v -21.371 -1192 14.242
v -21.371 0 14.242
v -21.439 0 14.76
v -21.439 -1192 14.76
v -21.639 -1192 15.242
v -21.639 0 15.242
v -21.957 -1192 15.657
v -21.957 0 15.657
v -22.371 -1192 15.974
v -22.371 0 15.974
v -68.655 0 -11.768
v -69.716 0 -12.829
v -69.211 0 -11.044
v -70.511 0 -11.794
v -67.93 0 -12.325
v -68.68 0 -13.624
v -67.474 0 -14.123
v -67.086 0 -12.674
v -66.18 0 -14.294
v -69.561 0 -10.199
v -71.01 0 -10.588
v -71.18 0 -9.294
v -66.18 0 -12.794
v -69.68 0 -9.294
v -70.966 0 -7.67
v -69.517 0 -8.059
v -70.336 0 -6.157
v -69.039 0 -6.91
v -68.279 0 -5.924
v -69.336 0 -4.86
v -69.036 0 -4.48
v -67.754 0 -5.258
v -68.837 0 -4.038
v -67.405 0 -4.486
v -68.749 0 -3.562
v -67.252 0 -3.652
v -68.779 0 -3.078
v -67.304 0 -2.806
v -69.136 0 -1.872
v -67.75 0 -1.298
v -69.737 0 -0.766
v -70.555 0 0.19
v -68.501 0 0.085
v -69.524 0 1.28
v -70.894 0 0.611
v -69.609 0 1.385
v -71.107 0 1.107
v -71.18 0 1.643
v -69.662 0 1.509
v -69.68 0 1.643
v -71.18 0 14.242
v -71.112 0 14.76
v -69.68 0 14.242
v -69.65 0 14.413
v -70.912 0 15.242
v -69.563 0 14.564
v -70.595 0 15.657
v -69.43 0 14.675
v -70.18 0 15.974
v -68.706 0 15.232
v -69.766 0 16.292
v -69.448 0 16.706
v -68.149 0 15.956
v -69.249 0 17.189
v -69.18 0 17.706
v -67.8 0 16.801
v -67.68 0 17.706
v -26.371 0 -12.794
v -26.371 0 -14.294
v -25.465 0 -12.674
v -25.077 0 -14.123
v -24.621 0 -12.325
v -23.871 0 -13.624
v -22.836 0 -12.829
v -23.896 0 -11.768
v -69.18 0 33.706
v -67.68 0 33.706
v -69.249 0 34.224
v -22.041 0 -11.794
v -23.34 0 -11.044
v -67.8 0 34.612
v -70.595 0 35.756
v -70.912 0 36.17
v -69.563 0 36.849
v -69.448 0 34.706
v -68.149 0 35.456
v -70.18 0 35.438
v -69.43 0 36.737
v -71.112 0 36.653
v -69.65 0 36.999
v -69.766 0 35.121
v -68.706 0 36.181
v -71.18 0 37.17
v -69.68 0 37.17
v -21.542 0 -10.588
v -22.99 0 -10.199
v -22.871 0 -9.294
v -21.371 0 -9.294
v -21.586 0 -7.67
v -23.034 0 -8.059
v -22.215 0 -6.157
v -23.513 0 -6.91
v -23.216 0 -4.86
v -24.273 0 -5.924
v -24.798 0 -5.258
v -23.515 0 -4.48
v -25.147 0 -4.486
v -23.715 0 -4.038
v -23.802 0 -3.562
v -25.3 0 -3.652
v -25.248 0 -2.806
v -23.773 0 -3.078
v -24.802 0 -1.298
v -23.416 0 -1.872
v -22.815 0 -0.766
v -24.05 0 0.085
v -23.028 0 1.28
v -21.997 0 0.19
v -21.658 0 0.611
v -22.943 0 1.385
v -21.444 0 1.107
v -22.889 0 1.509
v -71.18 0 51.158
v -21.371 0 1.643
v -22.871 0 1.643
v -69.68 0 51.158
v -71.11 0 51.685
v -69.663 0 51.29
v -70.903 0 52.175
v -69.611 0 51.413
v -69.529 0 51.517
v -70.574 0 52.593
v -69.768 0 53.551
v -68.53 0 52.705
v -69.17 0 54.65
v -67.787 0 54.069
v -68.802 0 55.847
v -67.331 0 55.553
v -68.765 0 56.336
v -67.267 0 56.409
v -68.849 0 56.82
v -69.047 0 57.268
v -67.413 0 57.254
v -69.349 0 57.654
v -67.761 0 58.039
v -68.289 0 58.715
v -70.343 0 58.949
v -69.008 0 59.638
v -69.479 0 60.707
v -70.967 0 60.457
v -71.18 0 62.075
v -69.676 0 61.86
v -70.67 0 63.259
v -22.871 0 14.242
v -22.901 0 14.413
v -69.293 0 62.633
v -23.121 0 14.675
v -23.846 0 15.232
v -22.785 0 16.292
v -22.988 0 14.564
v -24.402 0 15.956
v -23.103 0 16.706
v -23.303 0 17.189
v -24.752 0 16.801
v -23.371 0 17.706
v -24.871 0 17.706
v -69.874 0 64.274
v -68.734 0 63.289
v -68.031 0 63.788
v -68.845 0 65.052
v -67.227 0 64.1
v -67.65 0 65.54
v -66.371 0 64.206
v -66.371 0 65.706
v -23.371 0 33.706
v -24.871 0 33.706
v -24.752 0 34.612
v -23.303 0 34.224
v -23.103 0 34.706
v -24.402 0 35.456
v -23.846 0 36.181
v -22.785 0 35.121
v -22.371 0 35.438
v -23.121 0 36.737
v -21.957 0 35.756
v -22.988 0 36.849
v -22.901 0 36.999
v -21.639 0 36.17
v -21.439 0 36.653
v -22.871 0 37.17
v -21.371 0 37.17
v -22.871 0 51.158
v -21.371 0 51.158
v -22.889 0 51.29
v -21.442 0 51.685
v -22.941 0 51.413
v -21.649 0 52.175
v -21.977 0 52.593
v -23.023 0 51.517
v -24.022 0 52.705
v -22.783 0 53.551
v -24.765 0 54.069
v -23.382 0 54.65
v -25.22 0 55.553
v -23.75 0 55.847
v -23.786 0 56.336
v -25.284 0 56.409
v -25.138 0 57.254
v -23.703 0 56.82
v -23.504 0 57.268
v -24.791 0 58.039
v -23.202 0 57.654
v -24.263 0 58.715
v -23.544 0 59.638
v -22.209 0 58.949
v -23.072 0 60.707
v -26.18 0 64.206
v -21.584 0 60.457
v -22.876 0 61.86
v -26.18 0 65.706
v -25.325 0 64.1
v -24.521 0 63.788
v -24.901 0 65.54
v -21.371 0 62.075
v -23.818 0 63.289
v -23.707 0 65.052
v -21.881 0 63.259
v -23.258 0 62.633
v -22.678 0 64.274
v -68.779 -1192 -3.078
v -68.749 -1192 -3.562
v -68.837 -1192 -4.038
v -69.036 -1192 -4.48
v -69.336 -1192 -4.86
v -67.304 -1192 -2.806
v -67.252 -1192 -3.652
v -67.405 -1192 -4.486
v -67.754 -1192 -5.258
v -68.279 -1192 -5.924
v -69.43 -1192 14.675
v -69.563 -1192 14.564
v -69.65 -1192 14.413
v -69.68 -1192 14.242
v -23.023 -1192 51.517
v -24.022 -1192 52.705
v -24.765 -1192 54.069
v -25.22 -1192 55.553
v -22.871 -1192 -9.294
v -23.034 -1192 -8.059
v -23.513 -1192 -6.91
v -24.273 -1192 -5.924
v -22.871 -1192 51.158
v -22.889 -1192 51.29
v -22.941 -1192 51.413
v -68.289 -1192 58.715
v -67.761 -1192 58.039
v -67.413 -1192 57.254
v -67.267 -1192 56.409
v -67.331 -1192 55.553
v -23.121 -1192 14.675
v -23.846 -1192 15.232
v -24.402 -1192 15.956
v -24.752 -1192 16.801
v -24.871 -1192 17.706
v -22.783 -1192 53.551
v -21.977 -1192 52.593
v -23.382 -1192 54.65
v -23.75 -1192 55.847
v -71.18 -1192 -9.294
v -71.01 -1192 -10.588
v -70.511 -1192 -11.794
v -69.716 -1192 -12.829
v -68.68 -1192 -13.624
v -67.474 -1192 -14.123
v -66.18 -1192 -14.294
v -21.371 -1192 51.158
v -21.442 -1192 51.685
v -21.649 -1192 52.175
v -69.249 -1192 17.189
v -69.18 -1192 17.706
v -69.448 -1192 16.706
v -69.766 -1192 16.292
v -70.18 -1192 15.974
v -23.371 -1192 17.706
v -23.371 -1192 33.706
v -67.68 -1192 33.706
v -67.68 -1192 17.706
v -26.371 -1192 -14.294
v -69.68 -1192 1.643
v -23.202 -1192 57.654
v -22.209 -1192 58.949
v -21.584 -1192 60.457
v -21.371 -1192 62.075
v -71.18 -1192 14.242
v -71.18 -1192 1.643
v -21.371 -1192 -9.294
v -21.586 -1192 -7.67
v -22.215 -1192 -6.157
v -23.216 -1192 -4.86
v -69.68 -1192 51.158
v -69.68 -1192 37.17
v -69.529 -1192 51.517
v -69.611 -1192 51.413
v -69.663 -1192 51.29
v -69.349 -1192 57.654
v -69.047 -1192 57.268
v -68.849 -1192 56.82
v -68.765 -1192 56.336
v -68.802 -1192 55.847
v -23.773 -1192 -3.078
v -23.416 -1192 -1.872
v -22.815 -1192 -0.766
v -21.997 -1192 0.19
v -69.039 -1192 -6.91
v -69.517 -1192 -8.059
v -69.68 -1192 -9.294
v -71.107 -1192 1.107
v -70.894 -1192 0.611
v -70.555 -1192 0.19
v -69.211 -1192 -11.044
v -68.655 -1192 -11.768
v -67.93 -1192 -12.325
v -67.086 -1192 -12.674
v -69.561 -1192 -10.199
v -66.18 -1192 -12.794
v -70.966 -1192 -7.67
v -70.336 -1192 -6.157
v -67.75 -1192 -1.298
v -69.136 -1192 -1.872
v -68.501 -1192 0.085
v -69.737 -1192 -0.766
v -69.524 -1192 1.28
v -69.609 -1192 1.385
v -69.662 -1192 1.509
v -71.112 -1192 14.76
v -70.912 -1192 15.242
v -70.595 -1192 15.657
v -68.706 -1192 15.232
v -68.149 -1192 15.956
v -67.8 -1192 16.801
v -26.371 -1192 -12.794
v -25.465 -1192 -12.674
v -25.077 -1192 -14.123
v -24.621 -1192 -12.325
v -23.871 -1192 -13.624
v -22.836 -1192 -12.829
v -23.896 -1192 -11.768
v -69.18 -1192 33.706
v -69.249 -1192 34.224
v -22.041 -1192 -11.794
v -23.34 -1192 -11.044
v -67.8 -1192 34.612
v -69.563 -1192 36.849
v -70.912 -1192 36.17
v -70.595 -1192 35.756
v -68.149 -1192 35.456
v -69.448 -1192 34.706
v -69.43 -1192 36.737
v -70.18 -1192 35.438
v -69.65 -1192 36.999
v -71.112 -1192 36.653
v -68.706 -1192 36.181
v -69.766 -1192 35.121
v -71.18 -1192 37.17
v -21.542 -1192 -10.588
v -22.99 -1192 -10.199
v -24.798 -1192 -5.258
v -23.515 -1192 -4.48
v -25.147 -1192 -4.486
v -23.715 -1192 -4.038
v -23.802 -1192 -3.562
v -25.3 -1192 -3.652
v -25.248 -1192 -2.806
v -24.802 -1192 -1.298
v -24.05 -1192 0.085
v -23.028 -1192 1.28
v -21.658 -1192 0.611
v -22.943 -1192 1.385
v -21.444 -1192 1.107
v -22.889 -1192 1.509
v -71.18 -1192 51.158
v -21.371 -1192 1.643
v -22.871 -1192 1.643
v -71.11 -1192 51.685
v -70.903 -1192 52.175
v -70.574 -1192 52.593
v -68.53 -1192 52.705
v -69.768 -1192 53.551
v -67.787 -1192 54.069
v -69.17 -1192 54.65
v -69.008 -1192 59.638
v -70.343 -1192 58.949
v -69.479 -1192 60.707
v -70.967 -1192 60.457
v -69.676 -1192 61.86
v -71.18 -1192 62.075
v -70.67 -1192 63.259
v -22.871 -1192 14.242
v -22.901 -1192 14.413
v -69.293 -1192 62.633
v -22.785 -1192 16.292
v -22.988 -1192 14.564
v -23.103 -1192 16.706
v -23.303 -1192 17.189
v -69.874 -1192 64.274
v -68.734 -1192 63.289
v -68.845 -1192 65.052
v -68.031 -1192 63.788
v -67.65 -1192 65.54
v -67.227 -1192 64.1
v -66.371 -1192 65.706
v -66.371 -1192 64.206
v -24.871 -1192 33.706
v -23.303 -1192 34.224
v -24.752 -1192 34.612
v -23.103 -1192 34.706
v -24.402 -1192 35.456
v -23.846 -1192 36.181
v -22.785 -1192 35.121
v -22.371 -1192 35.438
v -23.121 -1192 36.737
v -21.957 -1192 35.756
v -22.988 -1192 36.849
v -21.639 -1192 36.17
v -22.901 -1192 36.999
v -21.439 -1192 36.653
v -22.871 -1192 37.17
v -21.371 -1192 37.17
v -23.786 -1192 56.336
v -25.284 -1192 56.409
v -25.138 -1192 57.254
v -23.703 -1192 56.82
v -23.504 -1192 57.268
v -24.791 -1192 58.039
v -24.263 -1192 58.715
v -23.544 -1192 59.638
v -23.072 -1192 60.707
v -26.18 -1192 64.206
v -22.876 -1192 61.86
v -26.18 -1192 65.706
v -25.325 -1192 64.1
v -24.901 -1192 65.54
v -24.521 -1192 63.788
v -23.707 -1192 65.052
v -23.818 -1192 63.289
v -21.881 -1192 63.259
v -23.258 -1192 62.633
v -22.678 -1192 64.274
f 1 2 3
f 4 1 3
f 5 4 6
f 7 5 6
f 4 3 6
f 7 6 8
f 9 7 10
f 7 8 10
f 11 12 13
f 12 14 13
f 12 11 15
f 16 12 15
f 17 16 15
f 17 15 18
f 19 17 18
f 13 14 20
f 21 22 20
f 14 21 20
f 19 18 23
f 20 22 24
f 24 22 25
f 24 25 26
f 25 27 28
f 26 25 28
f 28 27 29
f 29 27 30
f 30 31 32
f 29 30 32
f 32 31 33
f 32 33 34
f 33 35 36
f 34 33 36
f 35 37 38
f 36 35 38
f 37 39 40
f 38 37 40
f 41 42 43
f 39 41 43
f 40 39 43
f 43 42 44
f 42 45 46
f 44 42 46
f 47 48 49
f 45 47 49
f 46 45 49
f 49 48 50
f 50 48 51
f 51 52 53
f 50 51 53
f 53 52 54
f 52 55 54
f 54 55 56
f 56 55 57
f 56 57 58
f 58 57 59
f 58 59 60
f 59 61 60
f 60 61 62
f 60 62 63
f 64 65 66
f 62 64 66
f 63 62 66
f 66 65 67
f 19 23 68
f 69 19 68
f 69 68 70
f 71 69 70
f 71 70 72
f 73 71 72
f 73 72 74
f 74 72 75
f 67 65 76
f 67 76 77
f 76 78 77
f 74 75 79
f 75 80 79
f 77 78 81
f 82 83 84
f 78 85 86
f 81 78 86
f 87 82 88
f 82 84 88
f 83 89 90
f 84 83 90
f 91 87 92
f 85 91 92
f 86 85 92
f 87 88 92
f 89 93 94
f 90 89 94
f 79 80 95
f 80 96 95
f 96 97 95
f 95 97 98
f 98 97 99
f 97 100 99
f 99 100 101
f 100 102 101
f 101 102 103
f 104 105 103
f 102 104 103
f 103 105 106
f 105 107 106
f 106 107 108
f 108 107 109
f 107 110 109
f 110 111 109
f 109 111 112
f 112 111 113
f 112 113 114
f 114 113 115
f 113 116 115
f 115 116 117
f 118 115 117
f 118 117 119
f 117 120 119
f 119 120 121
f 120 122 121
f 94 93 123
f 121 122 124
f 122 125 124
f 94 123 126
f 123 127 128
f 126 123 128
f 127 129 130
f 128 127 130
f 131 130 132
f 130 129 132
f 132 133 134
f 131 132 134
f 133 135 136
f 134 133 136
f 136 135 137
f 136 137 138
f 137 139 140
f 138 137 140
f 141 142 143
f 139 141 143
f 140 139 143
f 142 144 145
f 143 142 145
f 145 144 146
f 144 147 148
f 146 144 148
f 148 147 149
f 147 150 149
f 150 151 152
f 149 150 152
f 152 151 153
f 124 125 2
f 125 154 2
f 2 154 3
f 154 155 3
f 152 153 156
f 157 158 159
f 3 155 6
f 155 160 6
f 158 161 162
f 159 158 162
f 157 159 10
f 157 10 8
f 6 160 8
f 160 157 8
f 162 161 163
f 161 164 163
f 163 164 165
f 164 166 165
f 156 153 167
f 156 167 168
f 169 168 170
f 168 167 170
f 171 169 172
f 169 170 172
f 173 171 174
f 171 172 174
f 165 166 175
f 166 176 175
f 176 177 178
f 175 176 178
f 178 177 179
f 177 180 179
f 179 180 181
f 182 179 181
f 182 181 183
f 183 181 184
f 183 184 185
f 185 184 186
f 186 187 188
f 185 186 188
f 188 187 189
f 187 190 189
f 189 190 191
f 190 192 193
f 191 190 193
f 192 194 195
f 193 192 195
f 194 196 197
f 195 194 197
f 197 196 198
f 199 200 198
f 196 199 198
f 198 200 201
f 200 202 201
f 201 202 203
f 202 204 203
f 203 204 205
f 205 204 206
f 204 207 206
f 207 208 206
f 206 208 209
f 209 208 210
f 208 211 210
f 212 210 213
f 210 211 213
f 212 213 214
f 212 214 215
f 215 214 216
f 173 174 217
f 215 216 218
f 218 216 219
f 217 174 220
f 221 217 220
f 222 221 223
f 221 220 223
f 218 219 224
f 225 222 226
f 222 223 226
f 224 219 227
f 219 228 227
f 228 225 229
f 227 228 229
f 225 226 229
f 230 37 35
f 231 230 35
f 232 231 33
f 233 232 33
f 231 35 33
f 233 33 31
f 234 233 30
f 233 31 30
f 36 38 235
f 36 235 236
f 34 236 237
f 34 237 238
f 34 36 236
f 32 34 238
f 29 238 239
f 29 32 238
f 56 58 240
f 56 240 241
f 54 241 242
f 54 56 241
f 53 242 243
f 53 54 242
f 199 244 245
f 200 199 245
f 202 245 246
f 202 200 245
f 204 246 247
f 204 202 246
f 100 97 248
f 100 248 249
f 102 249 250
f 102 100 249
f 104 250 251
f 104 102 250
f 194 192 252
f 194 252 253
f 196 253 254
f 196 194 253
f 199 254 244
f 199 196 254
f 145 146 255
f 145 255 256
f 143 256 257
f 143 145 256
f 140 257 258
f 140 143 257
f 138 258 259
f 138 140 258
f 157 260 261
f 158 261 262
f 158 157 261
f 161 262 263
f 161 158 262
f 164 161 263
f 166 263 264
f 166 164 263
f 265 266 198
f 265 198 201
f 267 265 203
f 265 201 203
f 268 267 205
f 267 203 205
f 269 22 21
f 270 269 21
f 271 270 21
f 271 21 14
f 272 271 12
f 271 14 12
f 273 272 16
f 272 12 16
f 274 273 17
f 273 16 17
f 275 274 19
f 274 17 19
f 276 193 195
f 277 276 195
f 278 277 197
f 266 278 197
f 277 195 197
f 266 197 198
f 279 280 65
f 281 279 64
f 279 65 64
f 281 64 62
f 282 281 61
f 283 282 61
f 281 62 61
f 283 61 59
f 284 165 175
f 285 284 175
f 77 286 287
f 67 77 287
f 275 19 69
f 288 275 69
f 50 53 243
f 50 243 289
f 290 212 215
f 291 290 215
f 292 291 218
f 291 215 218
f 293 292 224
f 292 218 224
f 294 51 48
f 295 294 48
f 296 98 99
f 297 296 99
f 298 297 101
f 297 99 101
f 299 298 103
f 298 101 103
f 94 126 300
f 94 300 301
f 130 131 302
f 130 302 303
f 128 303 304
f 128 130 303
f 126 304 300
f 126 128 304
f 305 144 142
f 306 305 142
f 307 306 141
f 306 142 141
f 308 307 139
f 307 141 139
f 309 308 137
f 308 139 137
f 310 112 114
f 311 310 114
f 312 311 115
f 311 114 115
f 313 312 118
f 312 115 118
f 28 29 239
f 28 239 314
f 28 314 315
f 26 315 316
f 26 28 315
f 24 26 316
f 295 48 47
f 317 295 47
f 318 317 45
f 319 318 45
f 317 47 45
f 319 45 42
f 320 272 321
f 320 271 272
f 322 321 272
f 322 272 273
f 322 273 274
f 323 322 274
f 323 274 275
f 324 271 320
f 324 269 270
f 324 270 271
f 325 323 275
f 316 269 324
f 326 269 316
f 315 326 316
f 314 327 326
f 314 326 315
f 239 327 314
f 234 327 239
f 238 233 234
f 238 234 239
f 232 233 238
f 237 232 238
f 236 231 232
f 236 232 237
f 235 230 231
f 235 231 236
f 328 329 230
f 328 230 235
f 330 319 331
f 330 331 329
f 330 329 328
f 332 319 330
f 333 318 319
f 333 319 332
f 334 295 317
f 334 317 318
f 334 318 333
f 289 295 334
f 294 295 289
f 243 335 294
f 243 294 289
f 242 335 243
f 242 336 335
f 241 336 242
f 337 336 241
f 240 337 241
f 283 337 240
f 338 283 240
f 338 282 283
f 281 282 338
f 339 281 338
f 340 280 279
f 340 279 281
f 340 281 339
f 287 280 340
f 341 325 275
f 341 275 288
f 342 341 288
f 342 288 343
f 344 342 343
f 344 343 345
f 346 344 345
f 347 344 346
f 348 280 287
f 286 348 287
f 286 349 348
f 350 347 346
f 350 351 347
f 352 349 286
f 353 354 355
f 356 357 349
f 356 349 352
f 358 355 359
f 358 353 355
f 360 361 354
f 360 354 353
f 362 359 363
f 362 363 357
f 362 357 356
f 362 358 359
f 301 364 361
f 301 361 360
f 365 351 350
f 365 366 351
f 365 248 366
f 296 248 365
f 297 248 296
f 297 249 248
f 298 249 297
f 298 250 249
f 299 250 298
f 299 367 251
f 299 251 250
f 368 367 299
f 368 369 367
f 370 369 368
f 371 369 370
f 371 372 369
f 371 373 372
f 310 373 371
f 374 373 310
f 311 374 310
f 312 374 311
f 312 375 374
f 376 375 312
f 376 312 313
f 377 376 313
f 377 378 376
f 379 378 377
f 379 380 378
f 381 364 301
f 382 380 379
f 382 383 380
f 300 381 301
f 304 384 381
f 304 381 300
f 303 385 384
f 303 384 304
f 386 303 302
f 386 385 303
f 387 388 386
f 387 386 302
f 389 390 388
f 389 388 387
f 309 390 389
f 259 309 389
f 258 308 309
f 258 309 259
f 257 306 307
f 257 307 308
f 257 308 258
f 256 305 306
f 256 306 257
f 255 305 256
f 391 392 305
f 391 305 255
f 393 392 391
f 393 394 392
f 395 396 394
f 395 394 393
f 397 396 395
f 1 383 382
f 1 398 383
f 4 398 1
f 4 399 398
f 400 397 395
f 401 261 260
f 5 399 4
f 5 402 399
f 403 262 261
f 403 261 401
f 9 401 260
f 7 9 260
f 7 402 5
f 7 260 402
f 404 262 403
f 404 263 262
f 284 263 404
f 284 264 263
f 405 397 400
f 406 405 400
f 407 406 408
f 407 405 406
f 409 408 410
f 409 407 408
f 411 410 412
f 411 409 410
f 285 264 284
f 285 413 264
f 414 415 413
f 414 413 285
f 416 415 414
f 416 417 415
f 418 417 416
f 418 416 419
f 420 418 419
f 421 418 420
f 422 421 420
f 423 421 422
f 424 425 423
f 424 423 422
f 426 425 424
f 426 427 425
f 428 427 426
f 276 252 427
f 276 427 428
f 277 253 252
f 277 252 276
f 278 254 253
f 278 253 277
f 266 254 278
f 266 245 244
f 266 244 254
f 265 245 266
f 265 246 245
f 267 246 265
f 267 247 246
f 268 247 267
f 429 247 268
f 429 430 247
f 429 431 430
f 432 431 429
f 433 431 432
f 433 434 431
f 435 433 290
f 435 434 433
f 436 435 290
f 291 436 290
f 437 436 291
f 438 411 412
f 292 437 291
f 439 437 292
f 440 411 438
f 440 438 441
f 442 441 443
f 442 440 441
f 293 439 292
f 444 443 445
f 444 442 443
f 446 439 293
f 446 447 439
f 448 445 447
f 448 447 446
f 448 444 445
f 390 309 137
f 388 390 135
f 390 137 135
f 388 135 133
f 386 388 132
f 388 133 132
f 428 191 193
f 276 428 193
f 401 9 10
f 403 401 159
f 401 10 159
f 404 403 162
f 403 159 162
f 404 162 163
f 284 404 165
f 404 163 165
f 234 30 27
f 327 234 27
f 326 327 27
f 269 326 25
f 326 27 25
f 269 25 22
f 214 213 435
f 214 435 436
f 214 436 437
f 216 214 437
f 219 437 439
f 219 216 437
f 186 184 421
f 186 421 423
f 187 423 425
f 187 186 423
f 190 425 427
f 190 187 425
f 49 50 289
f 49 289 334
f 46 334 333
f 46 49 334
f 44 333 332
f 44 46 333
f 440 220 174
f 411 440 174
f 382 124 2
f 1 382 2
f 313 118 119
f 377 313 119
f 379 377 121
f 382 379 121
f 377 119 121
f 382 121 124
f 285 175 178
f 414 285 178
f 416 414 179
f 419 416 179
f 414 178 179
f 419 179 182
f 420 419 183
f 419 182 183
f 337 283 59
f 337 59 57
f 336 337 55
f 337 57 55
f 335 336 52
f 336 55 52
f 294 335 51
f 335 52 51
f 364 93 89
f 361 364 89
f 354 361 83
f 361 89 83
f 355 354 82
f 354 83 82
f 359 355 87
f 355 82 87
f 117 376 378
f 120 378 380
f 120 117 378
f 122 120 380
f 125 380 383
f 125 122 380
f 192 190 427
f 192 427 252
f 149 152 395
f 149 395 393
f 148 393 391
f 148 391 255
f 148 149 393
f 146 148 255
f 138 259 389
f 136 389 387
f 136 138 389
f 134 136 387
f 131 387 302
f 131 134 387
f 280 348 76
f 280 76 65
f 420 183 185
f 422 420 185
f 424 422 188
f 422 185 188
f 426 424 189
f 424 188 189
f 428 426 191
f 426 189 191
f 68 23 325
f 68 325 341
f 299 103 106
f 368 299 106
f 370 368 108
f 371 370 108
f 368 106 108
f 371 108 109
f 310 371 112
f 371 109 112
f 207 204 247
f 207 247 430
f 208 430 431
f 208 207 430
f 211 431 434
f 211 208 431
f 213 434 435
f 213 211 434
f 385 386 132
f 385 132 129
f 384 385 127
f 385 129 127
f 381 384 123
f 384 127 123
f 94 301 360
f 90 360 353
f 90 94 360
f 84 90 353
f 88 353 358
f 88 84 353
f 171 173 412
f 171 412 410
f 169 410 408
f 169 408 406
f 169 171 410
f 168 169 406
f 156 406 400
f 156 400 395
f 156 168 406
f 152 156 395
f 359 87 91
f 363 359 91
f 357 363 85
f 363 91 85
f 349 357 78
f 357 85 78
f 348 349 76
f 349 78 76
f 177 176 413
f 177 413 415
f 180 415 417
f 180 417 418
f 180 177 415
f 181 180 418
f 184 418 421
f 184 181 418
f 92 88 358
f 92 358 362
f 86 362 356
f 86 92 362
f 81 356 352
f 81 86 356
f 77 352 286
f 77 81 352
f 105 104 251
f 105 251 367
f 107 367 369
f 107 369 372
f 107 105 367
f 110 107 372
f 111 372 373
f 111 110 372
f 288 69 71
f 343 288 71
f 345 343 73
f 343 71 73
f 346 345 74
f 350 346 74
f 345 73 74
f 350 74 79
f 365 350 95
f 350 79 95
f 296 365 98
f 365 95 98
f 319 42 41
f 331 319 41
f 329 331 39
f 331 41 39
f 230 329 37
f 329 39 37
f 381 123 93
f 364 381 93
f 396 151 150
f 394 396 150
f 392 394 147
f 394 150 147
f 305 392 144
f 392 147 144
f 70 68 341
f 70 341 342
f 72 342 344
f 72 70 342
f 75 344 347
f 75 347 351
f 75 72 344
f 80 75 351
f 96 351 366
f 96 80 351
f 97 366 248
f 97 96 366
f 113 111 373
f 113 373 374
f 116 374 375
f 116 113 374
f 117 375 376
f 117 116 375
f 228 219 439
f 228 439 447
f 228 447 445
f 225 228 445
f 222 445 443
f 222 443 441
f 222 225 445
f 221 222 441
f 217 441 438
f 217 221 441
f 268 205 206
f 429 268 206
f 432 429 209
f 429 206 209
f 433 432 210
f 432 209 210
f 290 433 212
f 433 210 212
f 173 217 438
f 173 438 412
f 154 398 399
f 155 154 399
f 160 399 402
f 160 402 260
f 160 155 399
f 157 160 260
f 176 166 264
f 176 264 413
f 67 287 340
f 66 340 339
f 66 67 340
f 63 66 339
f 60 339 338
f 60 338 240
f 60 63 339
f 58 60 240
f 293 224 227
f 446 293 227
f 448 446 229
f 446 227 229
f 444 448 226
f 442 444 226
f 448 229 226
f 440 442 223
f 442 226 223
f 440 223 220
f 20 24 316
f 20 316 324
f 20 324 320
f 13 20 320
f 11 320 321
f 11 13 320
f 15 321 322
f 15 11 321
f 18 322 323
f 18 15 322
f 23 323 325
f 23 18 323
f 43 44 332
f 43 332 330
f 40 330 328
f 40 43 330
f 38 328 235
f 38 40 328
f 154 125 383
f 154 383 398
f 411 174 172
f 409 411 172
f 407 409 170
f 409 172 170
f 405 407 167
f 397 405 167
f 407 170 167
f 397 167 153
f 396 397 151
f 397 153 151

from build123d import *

# Parameters (mm, degrees)
F1_DEPTH = 1192
F2_T     = -1.5


with BuildPart() as f1:
    # F0 (on Front) → F1 (new body)
    with BuildSketch(Plane.XZ):
        with BuildLine():
            Line((-26.180391, 65.706456), (-66.371201, 65.706456))
            ThreePointArc((-66.371201, 65.706456), (-69.384465, 64.696474), (-71.180391, 62.074554))
            ThreePointArc((-71.180391, 62.074554), (-70.704452, 59.682332), (-69.349119, 57.654447))
            ThreePointArc((-69.349119, 57.654447), (-68.848906, 56.819509), (-68.802041, 55.847326))
            ThreePointArc((-68.802041, 55.847326), (-69.441389, 54.085616), (-70.574311, 52.592674))
            ThreePointArc((-70.574311, 52.592674), (-71.022651, 51.936965), (-71.180391, 51.158454))
            Line((-71.180391, 51.158454), (-71.180391, 37.170454))
            ThreePointArc((-71.180391, 37.170454), (-70.912442, 36.170454), (-70.180391, 35.438403))
            ThreePointArc((-70.180391, 35.438403), (-69.448341, 34.706352), (-69.180391, 33.706352))
            Line((-69.180391, 33.706352), (-69.180391, 17.706456))
            ThreePointArc((-69.180391, 17.706456), (-69.448341, 16.706456), (-70.180391, 15.974405))
            ThreePointArc((-70.180391, 15.974405), (-70.912442, 15.242355), (-71.180391, 14.242355))
            Line((-71.180391, 14.242355), (-71.180391, 1.642835))
            ThreePointArc((-71.180391, 1.642835), (-71.017419, 0.852057), (-70.555062, 0.190155))
            ThreePointArc((-70.555062, 0.190155), (-69.407243, -1.302963), (-68.778829, -3.078347))
            ThreePointArc((-68.778829, -3.078347), (-68.836672, -4.038251), (-69.335836, -4.860197))
            ThreePointArc((-69.335836, -4.860197), (-70.700856, -6.892661), (-71.180391, -9.293544))
            ThreePointArc((-71.180391, -9.293544), (-69.715925, -12.829078), (-66.180391, -14.293544))
            Line((-66.180391, -14.293544), (-26.371201, -14.293544))
            ThreePointArc((-26.371201, -14.293544), (-22.835667, -12.829078), (-21.371201, -9.293544))
            ThreePointArc((-21.371201, -9.293544), (-21.850737, -6.892661), (-23.215757, -4.860197))
            ThreePointArc((-23.215757, -4.860197), (-23.71492, -4.038251), (-23.772764, -3.078347))
            ThreePointArc((-23.772764, -3.078347), (-23.14435, -1.302963), (-21.99653, 0.190155))
            ThreePointArc((-21.99653, 0.190155), (-21.534174, 0.852057), (-21.371201, 1.642835))
            Line((-21.371201, 1.642835), (-21.371201, 14.242355))
            ThreePointArc((-21.371201, 14.242355), (-21.639151, 15.242355), (-22.371201, 15.974405))
            ThreePointArc((-22.371201, 15.974405), (-23.103252, 16.706456), (-23.371201, 17.706456))
            Line((-23.371201, 17.706456), (-23.371201, 33.706352))
            ThreePointArc((-23.371201, 33.706352), (-23.103252, 34.706352), (-22.371201, 35.438403))
            ThreePointArc((-22.371201, 35.438403), (-21.639151, 36.170454), (-21.371201, 37.170454))
            Line((-21.371201, 37.170454), (-21.371201, 51.158454))
            ThreePointArc((-21.371201, 51.158454), (-21.528942, 51.936965), (-21.977282, 52.592674))
            ThreePointArc((-21.977282, 52.592674), (-23.110203, 54.085616), (-23.749551, 55.847326))
            ThreePointArc((-23.749551, 55.847326), (-23.702687, 56.819509), (-23.202474, 57.654447))
            ThreePointArc((-23.202474, 57.654447), (-21.847141, 59.682332), (-21.371201, 62.074554))
            ThreePointArc((-21.371201, 62.074554), (-23.167128, 64.696474), (-26.180391, 65.706456))
        make_face()
    extrude(amount=F1_DEPTH)

    # F2
    f2_openings = [f1.faces().sort_by_distance(p)[0] for p in [
        (-46.275796, -1192, 25.7149),
        (-46.275796, 0, 25.7149),
    ]]
    offset(amount=F2_T, openings=f2_openings)


solid = f1.part
